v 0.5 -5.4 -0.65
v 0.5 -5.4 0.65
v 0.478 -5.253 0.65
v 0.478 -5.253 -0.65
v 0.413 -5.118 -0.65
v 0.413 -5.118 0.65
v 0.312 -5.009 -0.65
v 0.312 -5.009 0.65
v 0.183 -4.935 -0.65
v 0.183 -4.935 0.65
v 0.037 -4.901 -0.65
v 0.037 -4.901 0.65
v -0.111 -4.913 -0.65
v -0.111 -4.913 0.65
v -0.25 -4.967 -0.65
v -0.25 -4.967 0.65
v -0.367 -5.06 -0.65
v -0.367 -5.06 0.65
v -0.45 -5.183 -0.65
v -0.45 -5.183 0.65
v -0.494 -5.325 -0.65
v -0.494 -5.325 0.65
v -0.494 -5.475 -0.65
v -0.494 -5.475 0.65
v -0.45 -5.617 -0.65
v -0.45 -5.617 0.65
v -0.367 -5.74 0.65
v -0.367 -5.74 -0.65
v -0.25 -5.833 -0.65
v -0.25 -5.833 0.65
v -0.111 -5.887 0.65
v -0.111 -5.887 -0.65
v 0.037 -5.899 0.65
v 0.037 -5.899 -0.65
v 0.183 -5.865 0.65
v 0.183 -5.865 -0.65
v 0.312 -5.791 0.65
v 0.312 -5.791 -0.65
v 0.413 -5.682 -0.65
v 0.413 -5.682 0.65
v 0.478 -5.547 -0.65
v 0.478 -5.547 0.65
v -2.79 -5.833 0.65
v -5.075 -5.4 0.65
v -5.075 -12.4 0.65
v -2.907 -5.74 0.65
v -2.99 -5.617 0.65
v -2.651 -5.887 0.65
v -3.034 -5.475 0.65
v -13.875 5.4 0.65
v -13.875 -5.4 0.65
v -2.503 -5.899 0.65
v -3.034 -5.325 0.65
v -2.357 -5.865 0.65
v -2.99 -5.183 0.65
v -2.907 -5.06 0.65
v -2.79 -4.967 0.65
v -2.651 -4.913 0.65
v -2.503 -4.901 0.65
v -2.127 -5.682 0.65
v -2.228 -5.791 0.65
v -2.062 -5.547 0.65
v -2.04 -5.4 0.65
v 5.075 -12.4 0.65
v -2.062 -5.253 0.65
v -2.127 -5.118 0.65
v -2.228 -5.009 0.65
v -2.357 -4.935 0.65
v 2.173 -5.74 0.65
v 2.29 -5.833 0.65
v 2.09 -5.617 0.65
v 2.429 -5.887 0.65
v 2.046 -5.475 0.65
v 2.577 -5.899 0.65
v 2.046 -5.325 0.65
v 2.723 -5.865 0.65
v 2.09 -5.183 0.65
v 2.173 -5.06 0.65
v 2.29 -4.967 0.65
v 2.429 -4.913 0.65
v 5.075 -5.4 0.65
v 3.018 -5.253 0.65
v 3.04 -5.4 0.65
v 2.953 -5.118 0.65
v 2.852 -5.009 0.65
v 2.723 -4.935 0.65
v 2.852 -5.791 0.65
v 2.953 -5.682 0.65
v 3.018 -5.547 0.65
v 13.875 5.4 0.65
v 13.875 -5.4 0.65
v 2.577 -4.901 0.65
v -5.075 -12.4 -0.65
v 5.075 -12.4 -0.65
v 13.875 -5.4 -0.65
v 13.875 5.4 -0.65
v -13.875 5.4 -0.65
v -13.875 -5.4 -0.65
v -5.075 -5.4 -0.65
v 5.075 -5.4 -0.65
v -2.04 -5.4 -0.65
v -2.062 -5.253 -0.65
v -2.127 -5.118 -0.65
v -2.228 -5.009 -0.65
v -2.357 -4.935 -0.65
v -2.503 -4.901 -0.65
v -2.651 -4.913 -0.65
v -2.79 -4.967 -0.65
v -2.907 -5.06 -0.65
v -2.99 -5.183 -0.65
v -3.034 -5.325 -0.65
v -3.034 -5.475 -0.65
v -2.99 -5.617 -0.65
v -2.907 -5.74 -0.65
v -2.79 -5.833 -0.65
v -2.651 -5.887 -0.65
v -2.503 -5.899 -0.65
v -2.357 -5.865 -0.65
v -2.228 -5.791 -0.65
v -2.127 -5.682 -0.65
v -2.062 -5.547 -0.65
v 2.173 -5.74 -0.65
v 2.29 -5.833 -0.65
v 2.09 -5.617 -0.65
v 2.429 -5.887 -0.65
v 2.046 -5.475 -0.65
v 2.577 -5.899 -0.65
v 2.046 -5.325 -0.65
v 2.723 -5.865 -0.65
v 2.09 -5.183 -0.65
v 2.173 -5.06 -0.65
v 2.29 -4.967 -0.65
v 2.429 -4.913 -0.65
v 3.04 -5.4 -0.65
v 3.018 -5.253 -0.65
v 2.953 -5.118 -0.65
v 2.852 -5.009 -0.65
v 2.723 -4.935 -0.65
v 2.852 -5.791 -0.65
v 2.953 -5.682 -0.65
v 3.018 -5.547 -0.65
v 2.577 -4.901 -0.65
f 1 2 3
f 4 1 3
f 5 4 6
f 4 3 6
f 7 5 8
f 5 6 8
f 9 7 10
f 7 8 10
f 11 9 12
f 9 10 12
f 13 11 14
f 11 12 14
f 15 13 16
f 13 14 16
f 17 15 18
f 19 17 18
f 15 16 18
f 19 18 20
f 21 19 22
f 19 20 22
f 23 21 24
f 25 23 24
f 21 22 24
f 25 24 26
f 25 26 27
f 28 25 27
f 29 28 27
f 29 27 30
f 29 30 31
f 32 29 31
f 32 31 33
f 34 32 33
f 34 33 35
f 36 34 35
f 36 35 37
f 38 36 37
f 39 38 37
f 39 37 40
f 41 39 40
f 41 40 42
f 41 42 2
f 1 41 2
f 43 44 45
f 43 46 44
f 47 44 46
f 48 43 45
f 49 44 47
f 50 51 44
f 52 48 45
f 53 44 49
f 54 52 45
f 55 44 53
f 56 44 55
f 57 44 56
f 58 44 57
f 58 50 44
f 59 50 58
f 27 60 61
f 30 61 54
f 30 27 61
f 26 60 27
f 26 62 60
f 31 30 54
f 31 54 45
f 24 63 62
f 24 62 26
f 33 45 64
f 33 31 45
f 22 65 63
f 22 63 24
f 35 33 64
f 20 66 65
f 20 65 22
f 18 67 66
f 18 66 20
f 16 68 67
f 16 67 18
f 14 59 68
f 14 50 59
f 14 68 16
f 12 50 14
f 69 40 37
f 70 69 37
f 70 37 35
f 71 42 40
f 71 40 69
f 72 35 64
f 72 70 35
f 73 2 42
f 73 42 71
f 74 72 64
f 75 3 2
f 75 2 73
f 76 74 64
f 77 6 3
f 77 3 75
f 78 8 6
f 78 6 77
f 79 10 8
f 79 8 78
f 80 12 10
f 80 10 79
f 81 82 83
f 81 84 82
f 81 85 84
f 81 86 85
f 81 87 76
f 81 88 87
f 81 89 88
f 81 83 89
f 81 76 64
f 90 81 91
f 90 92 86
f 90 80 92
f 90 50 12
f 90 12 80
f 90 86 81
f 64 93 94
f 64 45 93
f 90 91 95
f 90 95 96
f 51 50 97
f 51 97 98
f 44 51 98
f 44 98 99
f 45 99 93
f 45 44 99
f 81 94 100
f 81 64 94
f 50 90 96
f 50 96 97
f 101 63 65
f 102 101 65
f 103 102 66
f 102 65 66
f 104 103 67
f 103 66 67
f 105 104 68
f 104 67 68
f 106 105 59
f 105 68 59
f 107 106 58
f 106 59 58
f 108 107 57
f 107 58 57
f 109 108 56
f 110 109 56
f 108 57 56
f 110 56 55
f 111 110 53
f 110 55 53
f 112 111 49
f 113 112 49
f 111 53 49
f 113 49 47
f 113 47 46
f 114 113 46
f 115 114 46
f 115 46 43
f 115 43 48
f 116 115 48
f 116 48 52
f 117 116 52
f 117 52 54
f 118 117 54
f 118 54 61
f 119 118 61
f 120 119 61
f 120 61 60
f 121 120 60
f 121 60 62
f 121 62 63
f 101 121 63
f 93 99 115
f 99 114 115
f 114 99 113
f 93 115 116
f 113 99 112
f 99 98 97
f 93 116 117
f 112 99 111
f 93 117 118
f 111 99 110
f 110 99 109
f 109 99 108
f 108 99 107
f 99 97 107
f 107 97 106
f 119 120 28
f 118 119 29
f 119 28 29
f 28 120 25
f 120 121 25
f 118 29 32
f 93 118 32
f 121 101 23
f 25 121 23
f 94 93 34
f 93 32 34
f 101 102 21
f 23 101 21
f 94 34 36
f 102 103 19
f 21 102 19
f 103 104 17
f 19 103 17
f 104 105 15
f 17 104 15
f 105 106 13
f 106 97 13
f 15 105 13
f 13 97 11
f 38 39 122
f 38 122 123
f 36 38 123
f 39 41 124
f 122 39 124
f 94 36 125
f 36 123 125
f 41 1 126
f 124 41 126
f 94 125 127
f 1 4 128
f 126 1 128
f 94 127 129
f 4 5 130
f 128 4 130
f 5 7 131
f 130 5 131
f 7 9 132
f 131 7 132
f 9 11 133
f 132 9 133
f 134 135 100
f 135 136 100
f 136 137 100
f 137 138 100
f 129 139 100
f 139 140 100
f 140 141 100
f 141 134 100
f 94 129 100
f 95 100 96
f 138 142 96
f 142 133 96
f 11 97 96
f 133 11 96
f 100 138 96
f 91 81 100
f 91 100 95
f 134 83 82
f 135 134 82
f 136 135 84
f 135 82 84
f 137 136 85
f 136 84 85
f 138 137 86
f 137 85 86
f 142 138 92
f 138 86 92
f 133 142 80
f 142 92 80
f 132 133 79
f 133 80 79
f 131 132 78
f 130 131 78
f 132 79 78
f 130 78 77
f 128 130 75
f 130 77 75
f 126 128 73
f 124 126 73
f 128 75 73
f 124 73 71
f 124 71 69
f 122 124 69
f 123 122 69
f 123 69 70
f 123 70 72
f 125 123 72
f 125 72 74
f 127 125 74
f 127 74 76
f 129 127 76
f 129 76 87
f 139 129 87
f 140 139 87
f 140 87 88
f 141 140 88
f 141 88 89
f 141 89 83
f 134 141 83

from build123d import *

# Parameters (mm, degrees)
EXTRUDE1_DEPTH     = 0.65
CUT_EXTRUDE1_REACH = 20.654
SKETCH3_R          = 0.5
LPATTERN1_COUNT    = 3
LPATTERN1_PITCH    = 2.54


with BuildPart() as part:
    # Sketch1 → Extrude1 (new, symmetric)
    with BuildSketch(Plane.XY):
        Polygon((5.075, -12.4), (5.075, -5.4), (13.875, -5.4), (13.875, 5.4), (-13.875, 5.4), (-13.875, -5.4), (-5.075, -5.4), (-5.075, -12.4), align=None)
    extrude(amount=EXTRUDE1_DEPTH, both=True)

    # Sketch3 → Cut-Extrude1 (cut, up to next)
    with BuildSketch(Plane.XY.offset(0.65), mode=Mode.PRIVATE) as cut_extrude1_sk1:
        with Locations((2.54, -5.4)):
            Circle(SKETCH3_R)
    cut_extrude1_tool1 = extrude(cut_extrude1_sk1.sketch, amount=-CUT_EXTRUDE1_REACH, mode=Mode.PRIVATE) & part.part
    cut_extrude1 = cut_extrude1_tool1.solids().sort_by_distance((2.54, -5.4, 0.65))[0]
    add(cut_extrude1, mode=Mode.SUBTRACT)

    # LPattern1: Cut-Extrude1 ×3
    with Locations(*[(-i * LPATTERN1_PITCH, 0, 0) for i in range(1, LPATTERN1_COUNT)]):
        add(cut_extrude1, mode=Mode.SUBTRACT)


solid = part.part
